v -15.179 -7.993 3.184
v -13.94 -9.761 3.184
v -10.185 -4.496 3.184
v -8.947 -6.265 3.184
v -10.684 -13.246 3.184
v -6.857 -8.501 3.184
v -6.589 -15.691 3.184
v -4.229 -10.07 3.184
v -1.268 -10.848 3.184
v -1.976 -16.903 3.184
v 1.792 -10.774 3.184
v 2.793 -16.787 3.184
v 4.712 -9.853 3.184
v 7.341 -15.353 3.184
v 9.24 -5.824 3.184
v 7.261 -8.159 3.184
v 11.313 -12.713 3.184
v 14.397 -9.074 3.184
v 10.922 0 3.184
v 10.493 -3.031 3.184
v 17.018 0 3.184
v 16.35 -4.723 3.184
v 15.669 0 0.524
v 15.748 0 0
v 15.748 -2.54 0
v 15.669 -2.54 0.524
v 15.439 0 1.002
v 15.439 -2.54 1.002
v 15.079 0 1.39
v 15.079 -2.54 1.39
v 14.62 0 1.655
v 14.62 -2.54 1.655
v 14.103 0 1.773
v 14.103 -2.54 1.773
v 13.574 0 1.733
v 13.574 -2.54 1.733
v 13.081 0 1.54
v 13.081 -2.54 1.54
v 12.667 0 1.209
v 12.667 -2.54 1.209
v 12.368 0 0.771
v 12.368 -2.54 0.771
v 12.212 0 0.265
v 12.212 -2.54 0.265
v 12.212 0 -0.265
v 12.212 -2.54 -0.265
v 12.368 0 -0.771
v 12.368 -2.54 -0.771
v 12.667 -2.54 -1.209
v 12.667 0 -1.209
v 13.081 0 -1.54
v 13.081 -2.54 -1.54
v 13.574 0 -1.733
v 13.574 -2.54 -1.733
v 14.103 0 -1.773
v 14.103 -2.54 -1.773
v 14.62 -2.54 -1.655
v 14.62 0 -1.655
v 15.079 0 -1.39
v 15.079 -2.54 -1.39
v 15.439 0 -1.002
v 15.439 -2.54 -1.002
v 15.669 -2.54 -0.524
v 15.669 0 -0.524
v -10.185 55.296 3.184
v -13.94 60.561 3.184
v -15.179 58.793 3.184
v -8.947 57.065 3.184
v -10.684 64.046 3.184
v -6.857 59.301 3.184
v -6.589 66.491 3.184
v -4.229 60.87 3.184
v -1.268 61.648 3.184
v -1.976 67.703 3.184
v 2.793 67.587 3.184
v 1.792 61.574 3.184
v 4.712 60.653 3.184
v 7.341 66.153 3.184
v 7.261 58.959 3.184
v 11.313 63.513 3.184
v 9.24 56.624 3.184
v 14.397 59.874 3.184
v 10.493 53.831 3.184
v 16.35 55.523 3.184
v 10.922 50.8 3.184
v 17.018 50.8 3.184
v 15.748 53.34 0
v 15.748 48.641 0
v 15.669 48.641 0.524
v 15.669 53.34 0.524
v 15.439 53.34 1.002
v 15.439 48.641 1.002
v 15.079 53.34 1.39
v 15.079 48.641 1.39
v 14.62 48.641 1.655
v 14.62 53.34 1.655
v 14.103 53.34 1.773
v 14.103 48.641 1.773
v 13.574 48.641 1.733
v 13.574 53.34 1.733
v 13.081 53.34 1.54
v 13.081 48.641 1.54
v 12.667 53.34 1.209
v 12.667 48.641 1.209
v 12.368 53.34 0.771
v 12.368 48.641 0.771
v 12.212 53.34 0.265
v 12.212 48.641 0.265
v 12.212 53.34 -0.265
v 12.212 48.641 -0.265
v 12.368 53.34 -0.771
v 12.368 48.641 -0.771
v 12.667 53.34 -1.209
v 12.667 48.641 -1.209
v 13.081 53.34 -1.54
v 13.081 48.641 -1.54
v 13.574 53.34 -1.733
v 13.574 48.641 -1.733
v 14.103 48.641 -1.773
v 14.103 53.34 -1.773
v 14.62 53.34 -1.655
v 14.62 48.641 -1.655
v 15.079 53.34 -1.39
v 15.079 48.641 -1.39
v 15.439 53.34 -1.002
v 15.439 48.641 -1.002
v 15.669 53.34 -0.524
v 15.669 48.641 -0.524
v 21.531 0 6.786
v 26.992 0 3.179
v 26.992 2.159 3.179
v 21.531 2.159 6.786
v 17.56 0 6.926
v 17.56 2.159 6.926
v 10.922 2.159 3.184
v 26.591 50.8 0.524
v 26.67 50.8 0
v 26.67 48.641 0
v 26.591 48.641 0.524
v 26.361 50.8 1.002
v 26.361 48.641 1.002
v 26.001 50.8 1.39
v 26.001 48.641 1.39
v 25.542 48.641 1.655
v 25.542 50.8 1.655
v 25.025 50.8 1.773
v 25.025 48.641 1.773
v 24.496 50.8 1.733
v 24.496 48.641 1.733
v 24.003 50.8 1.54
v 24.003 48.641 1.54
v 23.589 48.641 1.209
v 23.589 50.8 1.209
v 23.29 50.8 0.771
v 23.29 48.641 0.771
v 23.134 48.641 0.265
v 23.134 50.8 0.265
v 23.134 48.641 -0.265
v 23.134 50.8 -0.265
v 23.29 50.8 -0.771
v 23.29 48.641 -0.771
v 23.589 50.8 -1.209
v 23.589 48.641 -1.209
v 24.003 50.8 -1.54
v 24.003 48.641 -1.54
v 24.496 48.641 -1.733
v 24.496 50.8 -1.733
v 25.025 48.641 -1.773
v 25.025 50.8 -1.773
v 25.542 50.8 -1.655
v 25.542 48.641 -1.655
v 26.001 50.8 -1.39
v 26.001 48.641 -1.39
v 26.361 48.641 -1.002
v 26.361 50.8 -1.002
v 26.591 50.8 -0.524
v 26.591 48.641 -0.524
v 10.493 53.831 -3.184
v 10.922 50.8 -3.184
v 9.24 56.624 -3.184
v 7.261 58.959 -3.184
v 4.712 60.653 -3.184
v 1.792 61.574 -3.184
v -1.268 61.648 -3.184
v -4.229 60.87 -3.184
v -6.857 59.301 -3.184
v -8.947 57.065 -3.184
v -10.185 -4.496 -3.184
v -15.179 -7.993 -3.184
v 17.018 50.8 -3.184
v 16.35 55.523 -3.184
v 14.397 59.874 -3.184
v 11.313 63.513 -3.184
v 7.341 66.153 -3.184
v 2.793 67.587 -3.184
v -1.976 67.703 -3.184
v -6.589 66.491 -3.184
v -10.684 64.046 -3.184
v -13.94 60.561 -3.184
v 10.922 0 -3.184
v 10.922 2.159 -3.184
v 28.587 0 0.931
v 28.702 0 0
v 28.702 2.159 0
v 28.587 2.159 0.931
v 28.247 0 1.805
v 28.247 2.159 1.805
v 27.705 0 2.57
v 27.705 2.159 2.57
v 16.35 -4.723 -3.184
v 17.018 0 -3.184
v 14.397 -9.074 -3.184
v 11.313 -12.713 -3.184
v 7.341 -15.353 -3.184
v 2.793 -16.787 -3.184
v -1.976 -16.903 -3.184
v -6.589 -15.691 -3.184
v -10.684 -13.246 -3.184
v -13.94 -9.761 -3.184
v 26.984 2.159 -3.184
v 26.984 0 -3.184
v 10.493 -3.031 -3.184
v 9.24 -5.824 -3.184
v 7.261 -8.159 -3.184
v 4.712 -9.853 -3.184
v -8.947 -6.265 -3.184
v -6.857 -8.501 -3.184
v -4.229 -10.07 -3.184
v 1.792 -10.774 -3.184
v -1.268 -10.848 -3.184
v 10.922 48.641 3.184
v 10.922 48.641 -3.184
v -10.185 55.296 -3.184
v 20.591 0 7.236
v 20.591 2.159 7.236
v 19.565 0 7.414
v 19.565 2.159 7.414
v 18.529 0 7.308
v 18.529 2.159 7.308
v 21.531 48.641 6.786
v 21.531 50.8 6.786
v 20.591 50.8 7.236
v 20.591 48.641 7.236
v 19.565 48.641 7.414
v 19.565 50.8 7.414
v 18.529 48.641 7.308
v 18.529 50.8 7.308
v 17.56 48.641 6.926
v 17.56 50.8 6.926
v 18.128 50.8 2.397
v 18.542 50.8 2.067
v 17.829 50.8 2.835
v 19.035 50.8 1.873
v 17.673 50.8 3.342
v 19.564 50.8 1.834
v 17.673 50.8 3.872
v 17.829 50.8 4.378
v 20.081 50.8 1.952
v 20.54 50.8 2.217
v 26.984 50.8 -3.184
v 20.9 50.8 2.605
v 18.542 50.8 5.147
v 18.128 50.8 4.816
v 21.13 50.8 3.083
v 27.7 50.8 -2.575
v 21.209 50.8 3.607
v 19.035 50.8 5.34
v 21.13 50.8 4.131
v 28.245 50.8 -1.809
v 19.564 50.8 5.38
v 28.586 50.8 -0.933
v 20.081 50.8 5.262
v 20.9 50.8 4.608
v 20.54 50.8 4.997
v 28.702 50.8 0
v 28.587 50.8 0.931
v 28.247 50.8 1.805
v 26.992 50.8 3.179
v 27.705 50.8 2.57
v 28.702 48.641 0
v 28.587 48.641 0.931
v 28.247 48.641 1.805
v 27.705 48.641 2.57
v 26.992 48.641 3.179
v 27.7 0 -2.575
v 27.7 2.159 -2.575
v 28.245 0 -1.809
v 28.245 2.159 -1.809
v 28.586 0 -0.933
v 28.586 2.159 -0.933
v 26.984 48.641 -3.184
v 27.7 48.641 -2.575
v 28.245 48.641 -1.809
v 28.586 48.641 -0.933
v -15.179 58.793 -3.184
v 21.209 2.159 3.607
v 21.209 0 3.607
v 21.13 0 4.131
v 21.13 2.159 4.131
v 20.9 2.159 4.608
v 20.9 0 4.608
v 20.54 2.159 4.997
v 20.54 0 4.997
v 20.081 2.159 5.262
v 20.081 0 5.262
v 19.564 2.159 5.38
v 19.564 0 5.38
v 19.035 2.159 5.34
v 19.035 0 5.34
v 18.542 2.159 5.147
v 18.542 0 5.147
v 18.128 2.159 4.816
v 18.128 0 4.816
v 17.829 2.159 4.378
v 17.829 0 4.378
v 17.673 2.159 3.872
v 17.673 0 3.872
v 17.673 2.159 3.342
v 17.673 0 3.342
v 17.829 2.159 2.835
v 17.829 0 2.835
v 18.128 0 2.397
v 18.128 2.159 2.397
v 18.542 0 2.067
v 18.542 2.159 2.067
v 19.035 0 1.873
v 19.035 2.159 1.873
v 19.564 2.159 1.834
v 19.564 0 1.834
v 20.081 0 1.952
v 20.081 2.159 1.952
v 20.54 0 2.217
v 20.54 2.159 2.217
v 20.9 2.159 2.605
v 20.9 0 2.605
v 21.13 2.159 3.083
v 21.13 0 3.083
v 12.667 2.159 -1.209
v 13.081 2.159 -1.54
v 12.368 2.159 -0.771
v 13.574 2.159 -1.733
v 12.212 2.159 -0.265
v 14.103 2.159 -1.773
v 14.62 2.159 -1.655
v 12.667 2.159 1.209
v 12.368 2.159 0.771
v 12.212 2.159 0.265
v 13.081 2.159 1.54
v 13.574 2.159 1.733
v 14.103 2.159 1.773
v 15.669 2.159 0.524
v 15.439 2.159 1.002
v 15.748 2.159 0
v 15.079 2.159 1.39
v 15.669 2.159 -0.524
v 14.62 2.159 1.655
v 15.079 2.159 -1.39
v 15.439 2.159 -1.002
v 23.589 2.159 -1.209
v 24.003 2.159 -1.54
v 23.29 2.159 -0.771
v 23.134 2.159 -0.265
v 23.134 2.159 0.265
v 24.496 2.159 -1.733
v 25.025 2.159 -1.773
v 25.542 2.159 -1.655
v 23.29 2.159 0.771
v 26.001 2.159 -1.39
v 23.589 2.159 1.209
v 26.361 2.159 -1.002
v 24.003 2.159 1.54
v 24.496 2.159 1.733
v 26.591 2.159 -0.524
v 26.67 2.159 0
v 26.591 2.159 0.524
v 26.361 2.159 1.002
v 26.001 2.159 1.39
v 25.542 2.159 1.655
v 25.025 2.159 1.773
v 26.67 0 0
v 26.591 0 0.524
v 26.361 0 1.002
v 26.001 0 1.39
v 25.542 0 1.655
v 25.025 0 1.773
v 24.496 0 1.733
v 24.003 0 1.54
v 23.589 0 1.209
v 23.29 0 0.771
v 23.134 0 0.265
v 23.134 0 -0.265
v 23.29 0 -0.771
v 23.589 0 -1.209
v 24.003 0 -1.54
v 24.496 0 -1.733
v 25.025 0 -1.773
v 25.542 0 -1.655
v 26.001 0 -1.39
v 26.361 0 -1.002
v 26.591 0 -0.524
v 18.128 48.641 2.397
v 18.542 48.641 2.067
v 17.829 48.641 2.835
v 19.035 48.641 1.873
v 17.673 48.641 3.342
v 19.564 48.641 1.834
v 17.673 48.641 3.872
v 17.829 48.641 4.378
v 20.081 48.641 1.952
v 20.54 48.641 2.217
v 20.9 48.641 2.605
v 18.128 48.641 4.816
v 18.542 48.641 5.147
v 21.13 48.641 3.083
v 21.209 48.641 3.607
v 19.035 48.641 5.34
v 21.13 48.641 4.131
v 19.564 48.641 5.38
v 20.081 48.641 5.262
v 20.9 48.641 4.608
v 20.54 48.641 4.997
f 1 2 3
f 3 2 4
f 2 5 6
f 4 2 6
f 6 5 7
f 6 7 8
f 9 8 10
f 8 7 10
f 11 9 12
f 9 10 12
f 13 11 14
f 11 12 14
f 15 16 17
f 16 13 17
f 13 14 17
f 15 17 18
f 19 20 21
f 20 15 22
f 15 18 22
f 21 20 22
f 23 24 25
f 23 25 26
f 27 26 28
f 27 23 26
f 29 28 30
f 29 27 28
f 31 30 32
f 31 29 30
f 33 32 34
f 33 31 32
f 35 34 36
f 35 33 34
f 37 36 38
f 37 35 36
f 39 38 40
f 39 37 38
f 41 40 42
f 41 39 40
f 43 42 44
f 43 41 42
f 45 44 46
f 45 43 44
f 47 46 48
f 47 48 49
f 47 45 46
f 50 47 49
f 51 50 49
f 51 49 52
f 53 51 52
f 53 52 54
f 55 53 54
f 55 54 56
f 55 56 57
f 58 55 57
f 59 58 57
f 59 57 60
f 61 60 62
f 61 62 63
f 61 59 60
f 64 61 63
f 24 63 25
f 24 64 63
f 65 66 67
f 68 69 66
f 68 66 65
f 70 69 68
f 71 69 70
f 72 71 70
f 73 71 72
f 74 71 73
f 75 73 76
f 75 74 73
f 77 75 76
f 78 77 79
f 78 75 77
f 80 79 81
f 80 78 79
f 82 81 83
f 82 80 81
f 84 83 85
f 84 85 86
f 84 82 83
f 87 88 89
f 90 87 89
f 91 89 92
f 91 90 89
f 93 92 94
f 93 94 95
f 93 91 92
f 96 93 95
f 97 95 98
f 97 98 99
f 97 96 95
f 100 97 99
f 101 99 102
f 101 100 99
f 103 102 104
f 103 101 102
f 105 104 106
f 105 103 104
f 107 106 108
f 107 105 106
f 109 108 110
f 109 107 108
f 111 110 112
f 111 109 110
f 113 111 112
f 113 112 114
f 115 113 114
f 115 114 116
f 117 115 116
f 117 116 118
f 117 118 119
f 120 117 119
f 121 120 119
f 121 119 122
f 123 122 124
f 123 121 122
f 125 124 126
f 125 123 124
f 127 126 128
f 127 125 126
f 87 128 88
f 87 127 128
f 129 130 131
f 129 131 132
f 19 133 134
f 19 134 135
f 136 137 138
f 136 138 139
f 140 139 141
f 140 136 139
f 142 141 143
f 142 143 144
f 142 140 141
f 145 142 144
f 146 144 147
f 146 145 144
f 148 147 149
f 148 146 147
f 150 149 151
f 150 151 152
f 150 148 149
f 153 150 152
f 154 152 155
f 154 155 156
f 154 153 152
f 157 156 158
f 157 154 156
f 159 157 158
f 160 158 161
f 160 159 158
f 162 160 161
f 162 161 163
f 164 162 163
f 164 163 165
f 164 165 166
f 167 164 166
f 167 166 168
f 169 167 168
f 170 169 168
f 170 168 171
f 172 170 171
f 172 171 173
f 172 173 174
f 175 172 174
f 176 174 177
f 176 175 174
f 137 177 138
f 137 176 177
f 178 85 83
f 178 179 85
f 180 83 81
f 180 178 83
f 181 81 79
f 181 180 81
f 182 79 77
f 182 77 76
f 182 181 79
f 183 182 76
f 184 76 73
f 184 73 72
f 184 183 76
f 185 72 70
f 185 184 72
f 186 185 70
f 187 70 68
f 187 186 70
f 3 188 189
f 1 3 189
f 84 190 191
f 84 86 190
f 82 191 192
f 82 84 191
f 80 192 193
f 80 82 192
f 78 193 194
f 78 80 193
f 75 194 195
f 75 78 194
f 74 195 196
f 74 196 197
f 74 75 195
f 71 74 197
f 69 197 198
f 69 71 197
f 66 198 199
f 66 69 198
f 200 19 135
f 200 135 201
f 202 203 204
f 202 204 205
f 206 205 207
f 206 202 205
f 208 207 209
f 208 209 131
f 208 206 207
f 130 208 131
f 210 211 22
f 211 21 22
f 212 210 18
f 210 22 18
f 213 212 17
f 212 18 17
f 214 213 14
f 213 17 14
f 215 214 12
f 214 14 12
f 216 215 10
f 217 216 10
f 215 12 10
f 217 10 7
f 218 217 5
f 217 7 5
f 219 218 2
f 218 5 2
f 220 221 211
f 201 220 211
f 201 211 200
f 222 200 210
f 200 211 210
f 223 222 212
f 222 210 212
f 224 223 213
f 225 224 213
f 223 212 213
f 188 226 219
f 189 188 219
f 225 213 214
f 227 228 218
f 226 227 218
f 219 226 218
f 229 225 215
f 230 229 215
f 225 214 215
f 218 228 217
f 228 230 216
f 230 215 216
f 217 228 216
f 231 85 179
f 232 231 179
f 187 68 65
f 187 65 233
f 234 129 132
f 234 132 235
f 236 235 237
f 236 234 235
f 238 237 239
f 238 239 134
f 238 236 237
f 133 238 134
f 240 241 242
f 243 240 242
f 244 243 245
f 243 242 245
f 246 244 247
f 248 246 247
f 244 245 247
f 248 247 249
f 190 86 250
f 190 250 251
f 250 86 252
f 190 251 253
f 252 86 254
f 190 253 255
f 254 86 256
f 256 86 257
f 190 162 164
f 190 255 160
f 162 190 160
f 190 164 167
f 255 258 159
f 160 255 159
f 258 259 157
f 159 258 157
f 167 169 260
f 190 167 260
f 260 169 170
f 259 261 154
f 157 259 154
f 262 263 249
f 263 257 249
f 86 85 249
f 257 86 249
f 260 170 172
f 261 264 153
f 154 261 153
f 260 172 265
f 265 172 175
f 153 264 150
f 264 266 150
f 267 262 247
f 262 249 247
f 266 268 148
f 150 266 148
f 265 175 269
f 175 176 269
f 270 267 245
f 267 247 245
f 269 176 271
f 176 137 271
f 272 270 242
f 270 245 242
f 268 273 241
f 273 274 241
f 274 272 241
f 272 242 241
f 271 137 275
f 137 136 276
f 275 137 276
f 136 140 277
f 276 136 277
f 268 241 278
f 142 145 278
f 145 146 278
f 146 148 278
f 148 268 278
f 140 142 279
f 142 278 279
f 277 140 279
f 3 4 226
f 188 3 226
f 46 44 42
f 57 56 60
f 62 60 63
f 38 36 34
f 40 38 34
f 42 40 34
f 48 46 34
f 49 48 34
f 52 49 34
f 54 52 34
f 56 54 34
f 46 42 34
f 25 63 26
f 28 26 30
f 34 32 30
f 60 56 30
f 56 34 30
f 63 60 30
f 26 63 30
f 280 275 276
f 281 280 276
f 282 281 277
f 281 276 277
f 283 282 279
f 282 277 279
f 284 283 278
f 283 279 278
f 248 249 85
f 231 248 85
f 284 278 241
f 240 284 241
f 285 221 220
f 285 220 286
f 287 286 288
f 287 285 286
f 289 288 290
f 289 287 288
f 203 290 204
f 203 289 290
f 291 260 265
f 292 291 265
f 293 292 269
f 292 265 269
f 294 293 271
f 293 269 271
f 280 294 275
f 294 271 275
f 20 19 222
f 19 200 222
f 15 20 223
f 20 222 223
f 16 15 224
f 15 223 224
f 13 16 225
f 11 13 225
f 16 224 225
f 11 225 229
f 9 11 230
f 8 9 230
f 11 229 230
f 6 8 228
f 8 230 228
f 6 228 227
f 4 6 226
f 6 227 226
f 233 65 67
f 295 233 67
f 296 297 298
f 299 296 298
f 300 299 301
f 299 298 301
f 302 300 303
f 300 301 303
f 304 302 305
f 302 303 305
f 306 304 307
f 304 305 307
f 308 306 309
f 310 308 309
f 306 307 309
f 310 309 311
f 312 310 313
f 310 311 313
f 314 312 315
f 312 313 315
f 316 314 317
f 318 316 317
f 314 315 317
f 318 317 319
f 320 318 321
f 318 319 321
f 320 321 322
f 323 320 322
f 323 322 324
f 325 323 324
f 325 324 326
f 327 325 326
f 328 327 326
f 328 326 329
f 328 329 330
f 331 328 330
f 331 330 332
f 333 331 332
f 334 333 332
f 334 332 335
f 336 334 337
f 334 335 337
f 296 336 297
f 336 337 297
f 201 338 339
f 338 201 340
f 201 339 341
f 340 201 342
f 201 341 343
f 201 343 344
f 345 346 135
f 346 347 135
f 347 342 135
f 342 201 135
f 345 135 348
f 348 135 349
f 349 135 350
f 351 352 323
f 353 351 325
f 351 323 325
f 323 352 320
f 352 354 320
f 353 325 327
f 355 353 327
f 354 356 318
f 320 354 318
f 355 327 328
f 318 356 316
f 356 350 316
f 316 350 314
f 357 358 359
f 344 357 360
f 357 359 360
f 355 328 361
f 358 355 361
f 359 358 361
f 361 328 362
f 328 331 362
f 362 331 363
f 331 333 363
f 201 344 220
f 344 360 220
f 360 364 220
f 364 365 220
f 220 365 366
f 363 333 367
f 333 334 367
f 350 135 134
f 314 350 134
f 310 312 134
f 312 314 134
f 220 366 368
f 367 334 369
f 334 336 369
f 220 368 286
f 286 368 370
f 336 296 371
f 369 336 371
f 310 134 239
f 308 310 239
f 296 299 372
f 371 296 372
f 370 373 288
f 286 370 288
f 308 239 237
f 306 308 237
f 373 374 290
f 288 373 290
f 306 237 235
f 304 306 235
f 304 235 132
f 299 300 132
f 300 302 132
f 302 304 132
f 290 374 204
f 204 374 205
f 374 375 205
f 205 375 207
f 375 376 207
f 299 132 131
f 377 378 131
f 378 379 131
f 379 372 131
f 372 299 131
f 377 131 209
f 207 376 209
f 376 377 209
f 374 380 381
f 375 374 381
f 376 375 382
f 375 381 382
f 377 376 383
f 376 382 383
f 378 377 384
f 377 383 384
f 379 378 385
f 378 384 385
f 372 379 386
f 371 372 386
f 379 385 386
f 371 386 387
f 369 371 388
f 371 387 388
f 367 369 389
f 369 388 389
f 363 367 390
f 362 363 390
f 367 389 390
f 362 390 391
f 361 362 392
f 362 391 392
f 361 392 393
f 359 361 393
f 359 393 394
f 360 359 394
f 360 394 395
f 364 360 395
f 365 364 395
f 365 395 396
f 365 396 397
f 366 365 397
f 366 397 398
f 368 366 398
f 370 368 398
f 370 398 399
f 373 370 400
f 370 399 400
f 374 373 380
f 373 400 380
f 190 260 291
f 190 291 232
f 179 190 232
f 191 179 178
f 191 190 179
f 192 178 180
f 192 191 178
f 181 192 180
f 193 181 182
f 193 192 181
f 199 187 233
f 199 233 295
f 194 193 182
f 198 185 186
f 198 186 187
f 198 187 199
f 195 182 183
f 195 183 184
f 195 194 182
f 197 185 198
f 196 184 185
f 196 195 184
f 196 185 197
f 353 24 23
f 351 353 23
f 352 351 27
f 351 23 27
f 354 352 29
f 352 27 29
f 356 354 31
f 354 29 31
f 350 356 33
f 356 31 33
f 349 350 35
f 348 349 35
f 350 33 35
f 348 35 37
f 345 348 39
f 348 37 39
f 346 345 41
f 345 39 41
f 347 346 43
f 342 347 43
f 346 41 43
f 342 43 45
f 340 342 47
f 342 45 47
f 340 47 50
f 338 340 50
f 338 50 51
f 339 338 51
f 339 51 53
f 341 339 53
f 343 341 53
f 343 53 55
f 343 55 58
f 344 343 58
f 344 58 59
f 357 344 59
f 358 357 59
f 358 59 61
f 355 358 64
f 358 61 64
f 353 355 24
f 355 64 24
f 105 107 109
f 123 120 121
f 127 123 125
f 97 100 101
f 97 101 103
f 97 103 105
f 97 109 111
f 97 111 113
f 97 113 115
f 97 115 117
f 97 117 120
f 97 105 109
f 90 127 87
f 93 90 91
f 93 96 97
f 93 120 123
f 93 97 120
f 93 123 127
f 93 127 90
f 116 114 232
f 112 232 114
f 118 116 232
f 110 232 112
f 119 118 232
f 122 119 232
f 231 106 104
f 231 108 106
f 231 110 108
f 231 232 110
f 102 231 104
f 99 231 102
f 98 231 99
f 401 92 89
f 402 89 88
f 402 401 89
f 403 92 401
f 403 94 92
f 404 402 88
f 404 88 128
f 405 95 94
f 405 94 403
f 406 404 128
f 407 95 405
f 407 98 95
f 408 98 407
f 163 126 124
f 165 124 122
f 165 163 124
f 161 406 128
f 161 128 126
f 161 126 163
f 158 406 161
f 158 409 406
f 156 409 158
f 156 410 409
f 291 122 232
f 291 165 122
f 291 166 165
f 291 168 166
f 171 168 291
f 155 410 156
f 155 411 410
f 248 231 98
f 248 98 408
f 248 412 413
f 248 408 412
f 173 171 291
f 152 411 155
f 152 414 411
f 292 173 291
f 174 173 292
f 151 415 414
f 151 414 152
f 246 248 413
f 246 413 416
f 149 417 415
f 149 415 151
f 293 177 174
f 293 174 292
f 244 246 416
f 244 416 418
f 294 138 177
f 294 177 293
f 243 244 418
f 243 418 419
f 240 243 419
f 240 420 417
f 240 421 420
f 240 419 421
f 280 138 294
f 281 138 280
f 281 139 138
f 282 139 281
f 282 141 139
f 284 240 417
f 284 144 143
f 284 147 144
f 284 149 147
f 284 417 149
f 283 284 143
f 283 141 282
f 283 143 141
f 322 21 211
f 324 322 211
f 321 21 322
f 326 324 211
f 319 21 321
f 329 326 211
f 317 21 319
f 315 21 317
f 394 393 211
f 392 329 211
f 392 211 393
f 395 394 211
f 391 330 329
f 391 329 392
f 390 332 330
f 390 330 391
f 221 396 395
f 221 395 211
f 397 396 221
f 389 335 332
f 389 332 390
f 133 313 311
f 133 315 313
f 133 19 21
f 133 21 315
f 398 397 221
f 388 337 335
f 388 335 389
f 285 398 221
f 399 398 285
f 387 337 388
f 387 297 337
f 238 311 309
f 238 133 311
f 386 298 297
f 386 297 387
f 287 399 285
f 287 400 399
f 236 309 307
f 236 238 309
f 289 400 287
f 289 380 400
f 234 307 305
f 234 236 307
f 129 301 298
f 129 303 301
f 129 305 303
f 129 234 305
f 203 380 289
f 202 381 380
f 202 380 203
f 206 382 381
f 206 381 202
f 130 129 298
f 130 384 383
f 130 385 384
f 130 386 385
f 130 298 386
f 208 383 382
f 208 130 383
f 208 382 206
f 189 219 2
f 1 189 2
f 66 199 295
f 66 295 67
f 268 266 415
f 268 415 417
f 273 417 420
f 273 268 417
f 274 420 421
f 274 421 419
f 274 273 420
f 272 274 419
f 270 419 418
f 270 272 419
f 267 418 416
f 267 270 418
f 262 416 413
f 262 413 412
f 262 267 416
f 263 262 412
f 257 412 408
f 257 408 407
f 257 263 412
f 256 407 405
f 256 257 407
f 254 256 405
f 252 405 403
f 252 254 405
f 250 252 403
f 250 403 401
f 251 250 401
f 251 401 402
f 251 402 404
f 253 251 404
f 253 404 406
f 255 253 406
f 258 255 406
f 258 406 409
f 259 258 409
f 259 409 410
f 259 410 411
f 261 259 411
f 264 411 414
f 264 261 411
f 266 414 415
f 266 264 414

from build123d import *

# Parameters (mm, degrees)
F0_R     = 1.778
F1_DEPTH = 2.159
F2_ANGLE = 145
F3_DEPTH = 2.54
F4_DEPTH = 2.159


with BuildPart() as f1:
    # F0 (on Front) → F1 (new body)
    with BuildSketch(Plane.XZ):
        with BuildLine():
            Line((10.922, 3.1840745665), (15.6445236422, 3.1840745665))
            ThreePointArc((15.6445236422, 3.1840745665), (16.0396062012, 5.3430454035), (17.5601409029, 6.9258339315))
            Line((17.5601409029, 6.9258339315), (10.922, 3.1840745665))
        make_face()
        with BuildLine():
            ThreePointArc((23.2369771619, 3.4317633085), (22.6101818624, 1.5070612816), (21.0860228381, 0.1750366915))
            ThreePointArc((21.0860228381, 0.1750366915), (21.4981289619, -1.7313980989), (22.7996880837, -3.1840745665))
            Line((22.7996880837, -3.1840745665), (26.9843119163, -3.1840745665))
            ThreePointArc((26.9843119163, -3.1840745665), (28.245193135, -1.8089211701), (28.702, 0))
            ThreePointArc((28.702, 0), (28.2473021114, 1.8050062995), (26.9917387184, 3.1791818624))
            ThreePointArc((26.9917387184, 3.1791818624), (25.147719378, 3.8014086336), (23.2369771619, 3.4317633085))
        make_face()
        with Locations((24.892, 0)):
            Circle(F0_R, mode=Mode.SUBTRACT)
        with BuildLine():
            Line((26.9917387184, 3.1791818624), (21.5307387184, 6.7859818624))
            ThreePointArc((21.5307387184, 6.7859818624), (22.7863021114, 5.4118062995), (23.241, 3.6068))
            ThreePointArc((23.241, 3.6068), (23.2399941577, 3.5192585432), (23.2369771619, 3.4317633085))
            ThreePointArc((23.2369771619, 3.4317633085), (25.147719378, 3.8014086336), (26.9917387184, 3.1791818624))
        make_face()
        with BuildLine():
            ThreePointArc((17.018, 0.6583205614), (16.0838765931, 1.786672285), (15.6445236422, 3.1840745665))
            Line((15.6445236422, 3.1840745665), (10.922, 3.1840745665))
            Line((10.922, 3.1840745665), (10.922, -3.1840745665))
            Line((10.922, -3.1840745665), (17.018, -3.1840745665))
            Line((17.018, -3.1840745665), (17.018, 0.6583205614))
        make_face()
        with Locations((13.97, 0)):
            Circle(F0_R, mode=Mode.SUBTRACT)
        with BuildLine():
            Line((15.6445236422, 3.1840745665), (17.018, 3.1840745665))
            Line((17.018, 3.1840745665), (17.018, 0.6583205614))
            ThreePointArc((17.018, 0.6583205614), (18.9815301243, -0.1765948817), (21.0860228381, 0.1750366915))
            ThreePointArc((21.0860228381, 0.1750366915), (21.7128181376, 2.0997387184), (23.2369771619, 3.4317633085))
            ThreePointArc((23.2369771619, 3.4317633085), (23.2399941577, 3.5192585432), (23.241, 3.6068))
            ThreePointArc((23.241, 3.6068), (22.7863021114, 5.4118062995), (21.5307387184, 6.7859818624))
            ThreePointArc((21.5307387184, 6.7859818624), (19.5651123431, 7.4144388851), (17.5601409029, 6.9258339315))
            ThreePointArc((17.5601409029, 6.9258339315), (16.0396062012, 5.3430454035), (15.6445236422, 3.1840745665))
        make_face()
        with Locations((19.431, 3.6068)):
            Circle(F0_R, mode=Mode.SUBTRACT)
        with BuildLine():
            ThreePointArc((23.2369771619, 3.4317633085), (21.7128181376, 2.0997387184), (21.0860228381, 0.1750366915))
            ThreePointArc((21.0860228381, 0.1750366915), (22.6101818624, 1.5070612816), (23.2369771619, 3.4317633085))
        make_face()
        with BuildLine():
            ThreePointArc((21.0860228381, 0.1750366915), (18.9815301243, -0.1765948817), (17.018, 0.6583205614))
            Line((17.018, 0.6583205614), (17.018, -3.1840745665))
            Line((17.018, -3.1840745665), (22.7996880837, -3.1840745665))
            ThreePointArc((22.7996880837, -3.1840745665), (21.4981289619, -1.7313980989), (21.0860228381, 0.1750366915))
        make_face()
        with BuildLine():
            Line((17.018, 0.6583205614), (17.018, 3.1840745665))
            Line((17.018, 3.1840745665), (15.6445236422, 3.1840745665))
            ThreePointArc((15.6445236422, 3.1840745665), (16.0838765931, 1.786672285), (17.018, 0.6583205614))
        make_face()
    extrude(amount=-F1_DEPTH)

    # F0 (on Front) → F2 (revolve)
    with BuildSketch(Plane.XZ):
        with BuildLine():
            ThreePointArc((17.018, 0.6583205614), (16.0838765931, 1.786672285), (15.6445236422, 3.1840745665))
            Line((15.6445236422, 3.1840745665), (10.922, 3.1840745665))
            Line((10.922, 3.1840745665), (10.922, -3.1840745665))
            Line((10.922, -3.1840745665), (17.018, -3.1840745665))
            Line((17.018, -3.1840745665), (17.018, 0.6583205614))
        make_face()
        with Locations((13.97, 0)):
            Circle(F0_R, mode=Mode.SUBTRACT)
        with Locations((13.97, 0)):
            Circle(F0_R)
        with BuildLine():
            Line((17.018, 0.6583205614), (17.018, 3.1840745665))
            Line((17.018, 3.1840745665), (15.6445236422, 3.1840745665))
            ThreePointArc((15.6445236422, 3.1840745665), (16.0838765931, 1.786672285), (17.018, 0.6583205614))
        make_face()
    revolve(axis=Axis((0, 0, 0), (0, 0, -1)), revolution_arc=F2_ANGLE)

    # F0 (on Front) → F3 (cut)
    with BuildSketch(Plane.XZ):
        with Locations((13.97, 0)):
            Circle(F0_R)
    extrude(amount=F3_DEPTH, mode=Mode.SUBTRACT)

    # F4 (add): a face of the model
    f4_faces = [f1.faces().sort_by_distance(p)[0] for p in [
        (-11.4435540587, -8.0128628158, 0),
    ]]
    extrude(f4_faces, amount=F4_DEPTH)


with BuildPart() as f6_1:
    # F6: instance of F1
    add(f1.part.mirror(Plane.XZ.offset(-25.4)))


solid = Compound([f1.part, f6_1.part])
